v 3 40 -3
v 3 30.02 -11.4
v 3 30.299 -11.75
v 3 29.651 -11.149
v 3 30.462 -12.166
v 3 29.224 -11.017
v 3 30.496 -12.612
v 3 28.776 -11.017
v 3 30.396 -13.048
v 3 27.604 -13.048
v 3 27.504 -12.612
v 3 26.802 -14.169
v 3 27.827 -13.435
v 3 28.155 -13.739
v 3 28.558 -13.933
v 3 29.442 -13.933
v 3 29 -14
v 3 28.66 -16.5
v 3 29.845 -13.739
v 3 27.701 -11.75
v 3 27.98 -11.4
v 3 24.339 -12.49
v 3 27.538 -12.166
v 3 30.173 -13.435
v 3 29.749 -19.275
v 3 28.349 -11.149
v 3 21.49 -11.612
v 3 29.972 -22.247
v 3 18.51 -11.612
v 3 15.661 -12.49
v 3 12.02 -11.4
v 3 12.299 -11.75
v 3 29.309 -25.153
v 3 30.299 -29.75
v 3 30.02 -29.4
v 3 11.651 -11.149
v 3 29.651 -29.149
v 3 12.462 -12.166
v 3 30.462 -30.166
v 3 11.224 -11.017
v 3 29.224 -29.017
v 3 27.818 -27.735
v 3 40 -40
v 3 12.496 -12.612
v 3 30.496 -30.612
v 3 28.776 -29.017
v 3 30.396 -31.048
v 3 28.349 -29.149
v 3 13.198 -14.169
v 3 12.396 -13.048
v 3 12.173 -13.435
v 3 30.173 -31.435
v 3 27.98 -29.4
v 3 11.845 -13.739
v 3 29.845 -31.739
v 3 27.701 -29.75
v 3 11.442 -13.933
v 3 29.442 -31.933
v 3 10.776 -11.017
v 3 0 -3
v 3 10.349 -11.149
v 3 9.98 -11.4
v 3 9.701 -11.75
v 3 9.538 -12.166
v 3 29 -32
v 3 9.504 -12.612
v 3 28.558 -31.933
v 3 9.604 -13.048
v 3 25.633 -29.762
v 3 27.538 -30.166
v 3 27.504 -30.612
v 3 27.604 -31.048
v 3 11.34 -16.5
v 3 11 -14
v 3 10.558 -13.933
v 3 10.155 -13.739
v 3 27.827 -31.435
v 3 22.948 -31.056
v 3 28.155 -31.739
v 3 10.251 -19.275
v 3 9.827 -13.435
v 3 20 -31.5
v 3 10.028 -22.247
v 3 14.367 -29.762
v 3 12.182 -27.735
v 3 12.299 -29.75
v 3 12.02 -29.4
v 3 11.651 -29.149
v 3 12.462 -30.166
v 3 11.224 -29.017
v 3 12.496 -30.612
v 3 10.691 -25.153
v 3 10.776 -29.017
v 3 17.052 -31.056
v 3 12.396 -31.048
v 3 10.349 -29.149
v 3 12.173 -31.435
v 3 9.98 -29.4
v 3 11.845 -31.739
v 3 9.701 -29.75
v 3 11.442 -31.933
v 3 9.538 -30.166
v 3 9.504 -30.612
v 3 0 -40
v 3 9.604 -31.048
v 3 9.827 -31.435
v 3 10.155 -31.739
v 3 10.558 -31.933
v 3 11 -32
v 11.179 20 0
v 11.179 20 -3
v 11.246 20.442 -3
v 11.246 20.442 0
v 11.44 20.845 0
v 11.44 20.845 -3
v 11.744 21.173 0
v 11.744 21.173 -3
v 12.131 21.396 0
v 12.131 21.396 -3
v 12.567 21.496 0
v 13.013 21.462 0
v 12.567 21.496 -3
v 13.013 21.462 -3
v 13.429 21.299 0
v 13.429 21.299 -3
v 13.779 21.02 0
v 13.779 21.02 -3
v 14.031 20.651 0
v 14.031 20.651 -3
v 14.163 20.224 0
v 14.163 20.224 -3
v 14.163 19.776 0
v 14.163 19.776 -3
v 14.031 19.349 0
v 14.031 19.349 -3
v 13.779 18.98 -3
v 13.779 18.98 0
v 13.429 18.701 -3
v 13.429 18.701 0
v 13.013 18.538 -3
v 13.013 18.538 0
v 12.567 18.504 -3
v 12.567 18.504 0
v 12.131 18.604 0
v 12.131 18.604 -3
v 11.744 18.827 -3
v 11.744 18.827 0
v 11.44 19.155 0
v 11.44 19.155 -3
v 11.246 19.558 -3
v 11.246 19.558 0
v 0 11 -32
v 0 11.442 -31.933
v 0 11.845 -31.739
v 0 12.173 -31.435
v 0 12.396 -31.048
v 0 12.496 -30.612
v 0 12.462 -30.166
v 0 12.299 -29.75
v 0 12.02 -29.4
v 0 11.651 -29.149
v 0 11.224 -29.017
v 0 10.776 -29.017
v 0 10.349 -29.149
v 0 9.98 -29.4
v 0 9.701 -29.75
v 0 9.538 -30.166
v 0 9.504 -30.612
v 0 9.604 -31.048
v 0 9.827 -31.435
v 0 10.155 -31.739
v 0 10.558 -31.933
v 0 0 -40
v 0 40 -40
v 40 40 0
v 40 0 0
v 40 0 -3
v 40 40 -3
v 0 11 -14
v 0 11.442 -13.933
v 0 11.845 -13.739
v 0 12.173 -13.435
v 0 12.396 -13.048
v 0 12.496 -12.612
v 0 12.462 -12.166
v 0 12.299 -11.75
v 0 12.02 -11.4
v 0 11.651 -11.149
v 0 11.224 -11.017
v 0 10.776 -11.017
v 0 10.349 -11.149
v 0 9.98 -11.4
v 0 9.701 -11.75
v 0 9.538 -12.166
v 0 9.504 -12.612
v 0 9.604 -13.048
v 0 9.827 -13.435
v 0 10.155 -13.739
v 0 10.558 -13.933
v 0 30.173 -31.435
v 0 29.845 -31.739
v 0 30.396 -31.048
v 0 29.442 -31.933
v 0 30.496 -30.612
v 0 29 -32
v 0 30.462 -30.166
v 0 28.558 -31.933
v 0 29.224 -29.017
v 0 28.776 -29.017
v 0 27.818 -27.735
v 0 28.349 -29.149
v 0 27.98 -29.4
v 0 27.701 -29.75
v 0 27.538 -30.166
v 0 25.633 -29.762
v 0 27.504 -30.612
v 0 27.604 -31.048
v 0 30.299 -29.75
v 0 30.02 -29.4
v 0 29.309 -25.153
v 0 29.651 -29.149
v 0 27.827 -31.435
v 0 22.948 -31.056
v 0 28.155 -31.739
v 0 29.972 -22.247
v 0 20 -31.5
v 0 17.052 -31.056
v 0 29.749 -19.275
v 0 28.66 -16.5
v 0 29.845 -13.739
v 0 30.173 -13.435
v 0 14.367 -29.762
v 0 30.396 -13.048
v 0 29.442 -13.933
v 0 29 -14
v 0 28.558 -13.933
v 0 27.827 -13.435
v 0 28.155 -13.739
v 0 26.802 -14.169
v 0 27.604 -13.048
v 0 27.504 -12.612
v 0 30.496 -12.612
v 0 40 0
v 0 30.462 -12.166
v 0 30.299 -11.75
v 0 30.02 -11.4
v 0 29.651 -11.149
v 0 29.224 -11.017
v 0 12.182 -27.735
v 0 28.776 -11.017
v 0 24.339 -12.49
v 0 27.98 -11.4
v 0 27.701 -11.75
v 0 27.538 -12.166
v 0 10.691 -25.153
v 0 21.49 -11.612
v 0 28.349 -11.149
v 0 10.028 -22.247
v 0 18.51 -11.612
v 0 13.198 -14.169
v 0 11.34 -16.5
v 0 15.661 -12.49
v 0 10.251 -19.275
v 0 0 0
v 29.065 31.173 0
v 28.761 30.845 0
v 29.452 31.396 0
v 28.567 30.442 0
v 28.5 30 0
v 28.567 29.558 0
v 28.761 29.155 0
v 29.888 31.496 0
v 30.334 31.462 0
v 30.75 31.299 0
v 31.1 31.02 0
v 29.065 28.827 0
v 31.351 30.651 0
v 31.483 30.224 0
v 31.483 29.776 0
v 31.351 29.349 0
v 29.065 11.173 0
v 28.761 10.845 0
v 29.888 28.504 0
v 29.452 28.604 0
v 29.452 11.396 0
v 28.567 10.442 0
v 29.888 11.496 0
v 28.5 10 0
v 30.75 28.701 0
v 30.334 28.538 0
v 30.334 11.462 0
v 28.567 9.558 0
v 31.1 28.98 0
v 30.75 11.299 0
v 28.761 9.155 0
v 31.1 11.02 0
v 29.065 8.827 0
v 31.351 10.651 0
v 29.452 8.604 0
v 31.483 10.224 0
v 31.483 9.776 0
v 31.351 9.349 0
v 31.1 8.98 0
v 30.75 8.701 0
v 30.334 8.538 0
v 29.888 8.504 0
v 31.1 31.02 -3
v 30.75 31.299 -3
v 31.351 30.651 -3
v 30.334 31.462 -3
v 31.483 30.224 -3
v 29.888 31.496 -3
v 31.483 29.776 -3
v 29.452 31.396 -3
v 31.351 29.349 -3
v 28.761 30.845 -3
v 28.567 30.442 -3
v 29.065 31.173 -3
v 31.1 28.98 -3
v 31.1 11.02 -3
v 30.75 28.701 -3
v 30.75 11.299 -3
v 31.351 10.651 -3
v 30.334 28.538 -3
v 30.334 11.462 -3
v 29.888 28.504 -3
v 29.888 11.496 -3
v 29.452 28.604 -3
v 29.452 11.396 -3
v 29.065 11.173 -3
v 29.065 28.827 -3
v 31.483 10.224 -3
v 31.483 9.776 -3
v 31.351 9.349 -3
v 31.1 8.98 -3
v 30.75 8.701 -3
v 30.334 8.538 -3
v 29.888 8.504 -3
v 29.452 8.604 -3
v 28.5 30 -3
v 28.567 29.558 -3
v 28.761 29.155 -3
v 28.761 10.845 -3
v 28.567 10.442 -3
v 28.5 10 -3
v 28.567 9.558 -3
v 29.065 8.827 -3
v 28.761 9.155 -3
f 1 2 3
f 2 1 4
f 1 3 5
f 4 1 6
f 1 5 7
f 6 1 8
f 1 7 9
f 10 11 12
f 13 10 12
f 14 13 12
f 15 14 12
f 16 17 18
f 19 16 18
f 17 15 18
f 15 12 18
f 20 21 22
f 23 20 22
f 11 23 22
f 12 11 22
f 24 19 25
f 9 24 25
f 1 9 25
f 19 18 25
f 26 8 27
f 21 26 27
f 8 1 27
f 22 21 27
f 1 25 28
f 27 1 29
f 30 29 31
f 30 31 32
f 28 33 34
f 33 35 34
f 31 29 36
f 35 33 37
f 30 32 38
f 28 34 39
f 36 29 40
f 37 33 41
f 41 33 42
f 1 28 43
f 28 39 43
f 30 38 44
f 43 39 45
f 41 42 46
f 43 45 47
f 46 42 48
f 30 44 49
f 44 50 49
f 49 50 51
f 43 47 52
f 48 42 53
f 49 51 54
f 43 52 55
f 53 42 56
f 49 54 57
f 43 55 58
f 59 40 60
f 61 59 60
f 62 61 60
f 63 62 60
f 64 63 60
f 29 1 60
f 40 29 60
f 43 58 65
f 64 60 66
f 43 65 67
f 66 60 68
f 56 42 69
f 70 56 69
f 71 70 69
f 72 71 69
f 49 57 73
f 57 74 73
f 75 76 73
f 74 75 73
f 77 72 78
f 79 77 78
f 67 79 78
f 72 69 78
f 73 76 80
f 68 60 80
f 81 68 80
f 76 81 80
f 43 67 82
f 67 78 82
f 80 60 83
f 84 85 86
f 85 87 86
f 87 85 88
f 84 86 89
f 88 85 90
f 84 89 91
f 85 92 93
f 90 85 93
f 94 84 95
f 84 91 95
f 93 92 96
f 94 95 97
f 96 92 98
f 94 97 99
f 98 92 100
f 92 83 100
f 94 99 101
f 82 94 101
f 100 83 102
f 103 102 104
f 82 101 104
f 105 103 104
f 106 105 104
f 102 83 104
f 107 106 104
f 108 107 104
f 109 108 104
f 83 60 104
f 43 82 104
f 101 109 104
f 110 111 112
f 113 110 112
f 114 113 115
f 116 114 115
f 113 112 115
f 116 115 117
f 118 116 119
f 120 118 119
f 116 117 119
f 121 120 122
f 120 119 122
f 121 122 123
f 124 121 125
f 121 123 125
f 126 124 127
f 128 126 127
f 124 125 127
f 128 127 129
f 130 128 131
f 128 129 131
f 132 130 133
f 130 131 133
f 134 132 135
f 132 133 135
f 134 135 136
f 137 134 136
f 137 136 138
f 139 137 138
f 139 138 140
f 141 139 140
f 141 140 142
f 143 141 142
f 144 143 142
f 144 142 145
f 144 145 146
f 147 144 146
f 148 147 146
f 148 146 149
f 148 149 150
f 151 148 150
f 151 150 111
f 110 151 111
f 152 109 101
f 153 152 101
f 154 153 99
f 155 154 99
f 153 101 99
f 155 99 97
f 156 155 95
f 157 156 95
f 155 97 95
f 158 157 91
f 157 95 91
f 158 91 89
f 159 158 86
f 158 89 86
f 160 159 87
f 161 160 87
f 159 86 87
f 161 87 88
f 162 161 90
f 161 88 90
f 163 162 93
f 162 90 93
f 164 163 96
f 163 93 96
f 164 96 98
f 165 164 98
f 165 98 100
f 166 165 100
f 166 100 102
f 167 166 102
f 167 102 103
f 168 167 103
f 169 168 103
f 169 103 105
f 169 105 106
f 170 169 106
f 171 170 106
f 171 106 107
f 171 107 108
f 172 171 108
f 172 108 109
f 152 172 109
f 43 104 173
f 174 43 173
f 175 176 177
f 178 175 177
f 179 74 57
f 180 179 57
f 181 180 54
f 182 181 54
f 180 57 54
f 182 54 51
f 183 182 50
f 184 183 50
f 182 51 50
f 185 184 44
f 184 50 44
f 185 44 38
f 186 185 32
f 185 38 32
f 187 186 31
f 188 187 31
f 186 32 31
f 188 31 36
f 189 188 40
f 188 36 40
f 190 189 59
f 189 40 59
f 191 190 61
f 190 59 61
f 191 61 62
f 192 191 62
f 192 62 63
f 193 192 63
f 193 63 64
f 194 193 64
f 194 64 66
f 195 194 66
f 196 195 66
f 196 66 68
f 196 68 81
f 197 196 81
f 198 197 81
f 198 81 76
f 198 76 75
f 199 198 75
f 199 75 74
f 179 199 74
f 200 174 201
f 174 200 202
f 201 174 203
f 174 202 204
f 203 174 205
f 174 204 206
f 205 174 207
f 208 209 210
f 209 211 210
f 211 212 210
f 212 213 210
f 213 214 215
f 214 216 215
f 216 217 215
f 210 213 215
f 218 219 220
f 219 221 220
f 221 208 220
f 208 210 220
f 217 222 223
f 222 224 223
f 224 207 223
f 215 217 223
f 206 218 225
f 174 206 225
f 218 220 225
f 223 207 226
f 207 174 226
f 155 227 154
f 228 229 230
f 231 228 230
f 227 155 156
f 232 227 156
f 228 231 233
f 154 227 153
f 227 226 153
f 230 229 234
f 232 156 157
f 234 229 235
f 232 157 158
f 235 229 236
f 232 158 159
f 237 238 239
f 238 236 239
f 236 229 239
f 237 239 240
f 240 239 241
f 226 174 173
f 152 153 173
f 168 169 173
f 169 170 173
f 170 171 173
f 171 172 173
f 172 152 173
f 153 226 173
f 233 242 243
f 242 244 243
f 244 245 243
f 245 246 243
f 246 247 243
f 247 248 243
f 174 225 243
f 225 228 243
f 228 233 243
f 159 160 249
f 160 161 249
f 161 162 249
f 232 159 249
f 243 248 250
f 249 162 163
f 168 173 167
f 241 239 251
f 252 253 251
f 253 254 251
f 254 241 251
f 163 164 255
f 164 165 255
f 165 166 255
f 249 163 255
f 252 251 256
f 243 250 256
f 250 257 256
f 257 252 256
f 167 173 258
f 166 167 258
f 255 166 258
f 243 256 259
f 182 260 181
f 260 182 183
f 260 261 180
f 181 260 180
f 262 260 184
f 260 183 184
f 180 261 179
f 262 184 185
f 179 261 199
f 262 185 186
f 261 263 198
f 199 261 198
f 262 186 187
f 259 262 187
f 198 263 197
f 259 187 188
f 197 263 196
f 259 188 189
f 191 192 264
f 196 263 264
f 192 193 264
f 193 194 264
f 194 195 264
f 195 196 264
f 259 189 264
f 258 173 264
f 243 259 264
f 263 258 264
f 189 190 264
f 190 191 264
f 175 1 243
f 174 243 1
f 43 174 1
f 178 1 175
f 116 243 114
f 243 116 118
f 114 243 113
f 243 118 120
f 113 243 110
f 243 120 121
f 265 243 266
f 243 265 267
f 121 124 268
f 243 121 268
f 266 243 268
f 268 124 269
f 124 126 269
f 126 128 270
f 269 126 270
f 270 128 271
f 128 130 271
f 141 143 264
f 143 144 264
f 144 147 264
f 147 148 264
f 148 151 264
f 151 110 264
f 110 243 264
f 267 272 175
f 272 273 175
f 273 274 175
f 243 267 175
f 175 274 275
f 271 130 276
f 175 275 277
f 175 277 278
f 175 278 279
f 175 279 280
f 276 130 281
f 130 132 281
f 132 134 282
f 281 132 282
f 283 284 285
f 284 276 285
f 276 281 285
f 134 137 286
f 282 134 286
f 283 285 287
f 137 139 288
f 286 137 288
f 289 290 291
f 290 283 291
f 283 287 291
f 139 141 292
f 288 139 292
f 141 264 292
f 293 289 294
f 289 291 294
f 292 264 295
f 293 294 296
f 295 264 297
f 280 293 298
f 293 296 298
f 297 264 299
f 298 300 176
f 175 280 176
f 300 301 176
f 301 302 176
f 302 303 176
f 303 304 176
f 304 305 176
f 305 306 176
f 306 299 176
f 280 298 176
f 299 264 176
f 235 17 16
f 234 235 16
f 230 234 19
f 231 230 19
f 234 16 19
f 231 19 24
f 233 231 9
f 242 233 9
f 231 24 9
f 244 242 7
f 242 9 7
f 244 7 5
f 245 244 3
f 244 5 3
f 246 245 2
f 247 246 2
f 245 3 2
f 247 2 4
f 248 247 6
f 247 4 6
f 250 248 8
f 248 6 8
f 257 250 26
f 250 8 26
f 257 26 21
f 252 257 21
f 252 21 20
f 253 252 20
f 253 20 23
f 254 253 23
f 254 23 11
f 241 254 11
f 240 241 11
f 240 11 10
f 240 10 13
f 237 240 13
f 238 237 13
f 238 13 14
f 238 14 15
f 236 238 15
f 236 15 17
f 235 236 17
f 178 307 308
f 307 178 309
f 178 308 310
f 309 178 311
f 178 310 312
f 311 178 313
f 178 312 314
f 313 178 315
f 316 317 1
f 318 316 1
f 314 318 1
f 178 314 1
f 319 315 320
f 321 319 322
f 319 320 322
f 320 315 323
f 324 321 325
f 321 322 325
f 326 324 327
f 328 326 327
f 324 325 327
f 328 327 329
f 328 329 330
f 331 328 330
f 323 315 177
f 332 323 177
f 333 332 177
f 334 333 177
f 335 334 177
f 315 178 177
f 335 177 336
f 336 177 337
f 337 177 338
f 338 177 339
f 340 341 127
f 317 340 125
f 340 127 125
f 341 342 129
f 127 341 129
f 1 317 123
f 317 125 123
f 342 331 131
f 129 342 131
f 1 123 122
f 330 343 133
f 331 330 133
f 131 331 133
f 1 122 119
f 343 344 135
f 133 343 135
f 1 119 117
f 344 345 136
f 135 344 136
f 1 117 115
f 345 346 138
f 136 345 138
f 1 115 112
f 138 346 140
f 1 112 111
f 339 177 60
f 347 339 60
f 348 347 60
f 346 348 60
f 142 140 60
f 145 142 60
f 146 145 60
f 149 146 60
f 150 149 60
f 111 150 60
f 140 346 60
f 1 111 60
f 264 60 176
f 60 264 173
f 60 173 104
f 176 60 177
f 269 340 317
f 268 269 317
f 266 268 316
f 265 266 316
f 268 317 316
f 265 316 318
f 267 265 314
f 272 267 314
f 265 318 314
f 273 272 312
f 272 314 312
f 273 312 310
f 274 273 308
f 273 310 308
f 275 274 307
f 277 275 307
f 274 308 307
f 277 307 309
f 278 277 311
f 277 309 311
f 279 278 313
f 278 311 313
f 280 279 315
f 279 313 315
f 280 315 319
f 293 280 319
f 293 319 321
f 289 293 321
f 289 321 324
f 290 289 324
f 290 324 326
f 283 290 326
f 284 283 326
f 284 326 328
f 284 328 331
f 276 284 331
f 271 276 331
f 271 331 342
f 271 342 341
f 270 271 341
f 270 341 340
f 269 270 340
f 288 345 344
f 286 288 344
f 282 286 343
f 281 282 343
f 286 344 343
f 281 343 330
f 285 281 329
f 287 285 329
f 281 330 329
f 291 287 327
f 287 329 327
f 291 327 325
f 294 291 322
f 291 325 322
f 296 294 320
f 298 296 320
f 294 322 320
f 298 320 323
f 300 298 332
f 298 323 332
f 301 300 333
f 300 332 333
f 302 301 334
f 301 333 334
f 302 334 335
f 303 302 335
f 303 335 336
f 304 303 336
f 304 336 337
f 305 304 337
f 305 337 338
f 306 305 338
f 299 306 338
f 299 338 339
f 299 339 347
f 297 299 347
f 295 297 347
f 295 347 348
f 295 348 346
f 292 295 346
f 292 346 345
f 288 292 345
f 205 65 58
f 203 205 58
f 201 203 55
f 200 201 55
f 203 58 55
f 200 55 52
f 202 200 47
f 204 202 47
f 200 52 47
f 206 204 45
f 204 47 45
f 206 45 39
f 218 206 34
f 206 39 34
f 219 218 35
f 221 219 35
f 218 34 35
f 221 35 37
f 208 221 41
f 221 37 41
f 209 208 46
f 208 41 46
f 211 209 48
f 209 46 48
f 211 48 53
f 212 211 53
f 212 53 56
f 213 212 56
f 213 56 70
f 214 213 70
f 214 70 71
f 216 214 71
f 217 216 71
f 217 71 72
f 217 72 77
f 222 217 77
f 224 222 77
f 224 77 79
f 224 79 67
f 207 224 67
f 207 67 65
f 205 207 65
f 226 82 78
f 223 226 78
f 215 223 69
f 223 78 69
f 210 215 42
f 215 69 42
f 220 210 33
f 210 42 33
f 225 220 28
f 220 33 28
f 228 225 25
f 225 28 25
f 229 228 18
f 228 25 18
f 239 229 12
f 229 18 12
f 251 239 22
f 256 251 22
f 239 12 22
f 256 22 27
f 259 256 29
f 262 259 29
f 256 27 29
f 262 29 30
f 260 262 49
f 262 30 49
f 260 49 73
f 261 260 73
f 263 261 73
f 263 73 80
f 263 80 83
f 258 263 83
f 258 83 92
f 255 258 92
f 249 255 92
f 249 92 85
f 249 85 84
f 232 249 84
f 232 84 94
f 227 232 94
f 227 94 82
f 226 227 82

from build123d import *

# Parameters (mm, degrees)
EXTRUDE_1_DEPTH     = 40
SKETCH_2_R          = 10
SKETCH_2_R_2        = 1.5
CUT_EXTRUDE_1_DEPTH = 40
SKETCH_3_R          = 1.5
CUT_EXTRUDE_2_DEPTH = 68.594378464


with BuildPart() as part:
    # Эскиз1 → Бобышка-Вытянуть1 (new body)
    with BuildSketch(Plane(origin=(0, 0, 0), x_dir=(1, 0, 0), z_dir=(0, 1, 0))):
        Polygon((0, 0), (40, 0), (40, 3), (3, 3), (3, 40), (0, 40), align=None)
    extrude(amount=EXTRUDE_1_DEPTH)

    # Эскиз2 → Вырез-Вытянуть1 (cut)
    with BuildSketch(Plane(origin=(3, 0, 0), x_dir=(0, 0, -1), z_dir=(1, 0, 0))):
        with Locations((21.5, 20)):
            Circle(SKETCH_2_R)
        with Locations((30.5, 29)):
            Circle(SKETCH_2_R_2)
        with Locations((30.5, 11)):
            Circle(SKETCH_2_R_2)
        with Locations((12.5, 11)):
            Circle(SKETCH_2_R_2)
        with Locations((12.5, 29)):
            Circle(SKETCH_2_R_2)
    extrude(amount=-CUT_EXTRUDE_1_DEPTH, mode=Mode.SUBTRACT)

    # Эскиз3 → Вырез-Вытянуть2 (cut, through all)
    with BuildSketch(Plane(origin=(0, 0, -3), x_dir=(-1, 0, 0), z_dir=(0, 0, -1))):
        with Locations((-30, 30)):
            Circle(SKETCH_3_R)
        with Locations((-12.679491924, 20)):
            Circle(SKETCH_3_R)
        with Locations((-30, 10)):
            Circle(SKETCH_3_R)
    extrude(amount=-CUT_EXTRUDE_2_DEPTH, mode=Mode.SUBTRACT)


solid = part.part
